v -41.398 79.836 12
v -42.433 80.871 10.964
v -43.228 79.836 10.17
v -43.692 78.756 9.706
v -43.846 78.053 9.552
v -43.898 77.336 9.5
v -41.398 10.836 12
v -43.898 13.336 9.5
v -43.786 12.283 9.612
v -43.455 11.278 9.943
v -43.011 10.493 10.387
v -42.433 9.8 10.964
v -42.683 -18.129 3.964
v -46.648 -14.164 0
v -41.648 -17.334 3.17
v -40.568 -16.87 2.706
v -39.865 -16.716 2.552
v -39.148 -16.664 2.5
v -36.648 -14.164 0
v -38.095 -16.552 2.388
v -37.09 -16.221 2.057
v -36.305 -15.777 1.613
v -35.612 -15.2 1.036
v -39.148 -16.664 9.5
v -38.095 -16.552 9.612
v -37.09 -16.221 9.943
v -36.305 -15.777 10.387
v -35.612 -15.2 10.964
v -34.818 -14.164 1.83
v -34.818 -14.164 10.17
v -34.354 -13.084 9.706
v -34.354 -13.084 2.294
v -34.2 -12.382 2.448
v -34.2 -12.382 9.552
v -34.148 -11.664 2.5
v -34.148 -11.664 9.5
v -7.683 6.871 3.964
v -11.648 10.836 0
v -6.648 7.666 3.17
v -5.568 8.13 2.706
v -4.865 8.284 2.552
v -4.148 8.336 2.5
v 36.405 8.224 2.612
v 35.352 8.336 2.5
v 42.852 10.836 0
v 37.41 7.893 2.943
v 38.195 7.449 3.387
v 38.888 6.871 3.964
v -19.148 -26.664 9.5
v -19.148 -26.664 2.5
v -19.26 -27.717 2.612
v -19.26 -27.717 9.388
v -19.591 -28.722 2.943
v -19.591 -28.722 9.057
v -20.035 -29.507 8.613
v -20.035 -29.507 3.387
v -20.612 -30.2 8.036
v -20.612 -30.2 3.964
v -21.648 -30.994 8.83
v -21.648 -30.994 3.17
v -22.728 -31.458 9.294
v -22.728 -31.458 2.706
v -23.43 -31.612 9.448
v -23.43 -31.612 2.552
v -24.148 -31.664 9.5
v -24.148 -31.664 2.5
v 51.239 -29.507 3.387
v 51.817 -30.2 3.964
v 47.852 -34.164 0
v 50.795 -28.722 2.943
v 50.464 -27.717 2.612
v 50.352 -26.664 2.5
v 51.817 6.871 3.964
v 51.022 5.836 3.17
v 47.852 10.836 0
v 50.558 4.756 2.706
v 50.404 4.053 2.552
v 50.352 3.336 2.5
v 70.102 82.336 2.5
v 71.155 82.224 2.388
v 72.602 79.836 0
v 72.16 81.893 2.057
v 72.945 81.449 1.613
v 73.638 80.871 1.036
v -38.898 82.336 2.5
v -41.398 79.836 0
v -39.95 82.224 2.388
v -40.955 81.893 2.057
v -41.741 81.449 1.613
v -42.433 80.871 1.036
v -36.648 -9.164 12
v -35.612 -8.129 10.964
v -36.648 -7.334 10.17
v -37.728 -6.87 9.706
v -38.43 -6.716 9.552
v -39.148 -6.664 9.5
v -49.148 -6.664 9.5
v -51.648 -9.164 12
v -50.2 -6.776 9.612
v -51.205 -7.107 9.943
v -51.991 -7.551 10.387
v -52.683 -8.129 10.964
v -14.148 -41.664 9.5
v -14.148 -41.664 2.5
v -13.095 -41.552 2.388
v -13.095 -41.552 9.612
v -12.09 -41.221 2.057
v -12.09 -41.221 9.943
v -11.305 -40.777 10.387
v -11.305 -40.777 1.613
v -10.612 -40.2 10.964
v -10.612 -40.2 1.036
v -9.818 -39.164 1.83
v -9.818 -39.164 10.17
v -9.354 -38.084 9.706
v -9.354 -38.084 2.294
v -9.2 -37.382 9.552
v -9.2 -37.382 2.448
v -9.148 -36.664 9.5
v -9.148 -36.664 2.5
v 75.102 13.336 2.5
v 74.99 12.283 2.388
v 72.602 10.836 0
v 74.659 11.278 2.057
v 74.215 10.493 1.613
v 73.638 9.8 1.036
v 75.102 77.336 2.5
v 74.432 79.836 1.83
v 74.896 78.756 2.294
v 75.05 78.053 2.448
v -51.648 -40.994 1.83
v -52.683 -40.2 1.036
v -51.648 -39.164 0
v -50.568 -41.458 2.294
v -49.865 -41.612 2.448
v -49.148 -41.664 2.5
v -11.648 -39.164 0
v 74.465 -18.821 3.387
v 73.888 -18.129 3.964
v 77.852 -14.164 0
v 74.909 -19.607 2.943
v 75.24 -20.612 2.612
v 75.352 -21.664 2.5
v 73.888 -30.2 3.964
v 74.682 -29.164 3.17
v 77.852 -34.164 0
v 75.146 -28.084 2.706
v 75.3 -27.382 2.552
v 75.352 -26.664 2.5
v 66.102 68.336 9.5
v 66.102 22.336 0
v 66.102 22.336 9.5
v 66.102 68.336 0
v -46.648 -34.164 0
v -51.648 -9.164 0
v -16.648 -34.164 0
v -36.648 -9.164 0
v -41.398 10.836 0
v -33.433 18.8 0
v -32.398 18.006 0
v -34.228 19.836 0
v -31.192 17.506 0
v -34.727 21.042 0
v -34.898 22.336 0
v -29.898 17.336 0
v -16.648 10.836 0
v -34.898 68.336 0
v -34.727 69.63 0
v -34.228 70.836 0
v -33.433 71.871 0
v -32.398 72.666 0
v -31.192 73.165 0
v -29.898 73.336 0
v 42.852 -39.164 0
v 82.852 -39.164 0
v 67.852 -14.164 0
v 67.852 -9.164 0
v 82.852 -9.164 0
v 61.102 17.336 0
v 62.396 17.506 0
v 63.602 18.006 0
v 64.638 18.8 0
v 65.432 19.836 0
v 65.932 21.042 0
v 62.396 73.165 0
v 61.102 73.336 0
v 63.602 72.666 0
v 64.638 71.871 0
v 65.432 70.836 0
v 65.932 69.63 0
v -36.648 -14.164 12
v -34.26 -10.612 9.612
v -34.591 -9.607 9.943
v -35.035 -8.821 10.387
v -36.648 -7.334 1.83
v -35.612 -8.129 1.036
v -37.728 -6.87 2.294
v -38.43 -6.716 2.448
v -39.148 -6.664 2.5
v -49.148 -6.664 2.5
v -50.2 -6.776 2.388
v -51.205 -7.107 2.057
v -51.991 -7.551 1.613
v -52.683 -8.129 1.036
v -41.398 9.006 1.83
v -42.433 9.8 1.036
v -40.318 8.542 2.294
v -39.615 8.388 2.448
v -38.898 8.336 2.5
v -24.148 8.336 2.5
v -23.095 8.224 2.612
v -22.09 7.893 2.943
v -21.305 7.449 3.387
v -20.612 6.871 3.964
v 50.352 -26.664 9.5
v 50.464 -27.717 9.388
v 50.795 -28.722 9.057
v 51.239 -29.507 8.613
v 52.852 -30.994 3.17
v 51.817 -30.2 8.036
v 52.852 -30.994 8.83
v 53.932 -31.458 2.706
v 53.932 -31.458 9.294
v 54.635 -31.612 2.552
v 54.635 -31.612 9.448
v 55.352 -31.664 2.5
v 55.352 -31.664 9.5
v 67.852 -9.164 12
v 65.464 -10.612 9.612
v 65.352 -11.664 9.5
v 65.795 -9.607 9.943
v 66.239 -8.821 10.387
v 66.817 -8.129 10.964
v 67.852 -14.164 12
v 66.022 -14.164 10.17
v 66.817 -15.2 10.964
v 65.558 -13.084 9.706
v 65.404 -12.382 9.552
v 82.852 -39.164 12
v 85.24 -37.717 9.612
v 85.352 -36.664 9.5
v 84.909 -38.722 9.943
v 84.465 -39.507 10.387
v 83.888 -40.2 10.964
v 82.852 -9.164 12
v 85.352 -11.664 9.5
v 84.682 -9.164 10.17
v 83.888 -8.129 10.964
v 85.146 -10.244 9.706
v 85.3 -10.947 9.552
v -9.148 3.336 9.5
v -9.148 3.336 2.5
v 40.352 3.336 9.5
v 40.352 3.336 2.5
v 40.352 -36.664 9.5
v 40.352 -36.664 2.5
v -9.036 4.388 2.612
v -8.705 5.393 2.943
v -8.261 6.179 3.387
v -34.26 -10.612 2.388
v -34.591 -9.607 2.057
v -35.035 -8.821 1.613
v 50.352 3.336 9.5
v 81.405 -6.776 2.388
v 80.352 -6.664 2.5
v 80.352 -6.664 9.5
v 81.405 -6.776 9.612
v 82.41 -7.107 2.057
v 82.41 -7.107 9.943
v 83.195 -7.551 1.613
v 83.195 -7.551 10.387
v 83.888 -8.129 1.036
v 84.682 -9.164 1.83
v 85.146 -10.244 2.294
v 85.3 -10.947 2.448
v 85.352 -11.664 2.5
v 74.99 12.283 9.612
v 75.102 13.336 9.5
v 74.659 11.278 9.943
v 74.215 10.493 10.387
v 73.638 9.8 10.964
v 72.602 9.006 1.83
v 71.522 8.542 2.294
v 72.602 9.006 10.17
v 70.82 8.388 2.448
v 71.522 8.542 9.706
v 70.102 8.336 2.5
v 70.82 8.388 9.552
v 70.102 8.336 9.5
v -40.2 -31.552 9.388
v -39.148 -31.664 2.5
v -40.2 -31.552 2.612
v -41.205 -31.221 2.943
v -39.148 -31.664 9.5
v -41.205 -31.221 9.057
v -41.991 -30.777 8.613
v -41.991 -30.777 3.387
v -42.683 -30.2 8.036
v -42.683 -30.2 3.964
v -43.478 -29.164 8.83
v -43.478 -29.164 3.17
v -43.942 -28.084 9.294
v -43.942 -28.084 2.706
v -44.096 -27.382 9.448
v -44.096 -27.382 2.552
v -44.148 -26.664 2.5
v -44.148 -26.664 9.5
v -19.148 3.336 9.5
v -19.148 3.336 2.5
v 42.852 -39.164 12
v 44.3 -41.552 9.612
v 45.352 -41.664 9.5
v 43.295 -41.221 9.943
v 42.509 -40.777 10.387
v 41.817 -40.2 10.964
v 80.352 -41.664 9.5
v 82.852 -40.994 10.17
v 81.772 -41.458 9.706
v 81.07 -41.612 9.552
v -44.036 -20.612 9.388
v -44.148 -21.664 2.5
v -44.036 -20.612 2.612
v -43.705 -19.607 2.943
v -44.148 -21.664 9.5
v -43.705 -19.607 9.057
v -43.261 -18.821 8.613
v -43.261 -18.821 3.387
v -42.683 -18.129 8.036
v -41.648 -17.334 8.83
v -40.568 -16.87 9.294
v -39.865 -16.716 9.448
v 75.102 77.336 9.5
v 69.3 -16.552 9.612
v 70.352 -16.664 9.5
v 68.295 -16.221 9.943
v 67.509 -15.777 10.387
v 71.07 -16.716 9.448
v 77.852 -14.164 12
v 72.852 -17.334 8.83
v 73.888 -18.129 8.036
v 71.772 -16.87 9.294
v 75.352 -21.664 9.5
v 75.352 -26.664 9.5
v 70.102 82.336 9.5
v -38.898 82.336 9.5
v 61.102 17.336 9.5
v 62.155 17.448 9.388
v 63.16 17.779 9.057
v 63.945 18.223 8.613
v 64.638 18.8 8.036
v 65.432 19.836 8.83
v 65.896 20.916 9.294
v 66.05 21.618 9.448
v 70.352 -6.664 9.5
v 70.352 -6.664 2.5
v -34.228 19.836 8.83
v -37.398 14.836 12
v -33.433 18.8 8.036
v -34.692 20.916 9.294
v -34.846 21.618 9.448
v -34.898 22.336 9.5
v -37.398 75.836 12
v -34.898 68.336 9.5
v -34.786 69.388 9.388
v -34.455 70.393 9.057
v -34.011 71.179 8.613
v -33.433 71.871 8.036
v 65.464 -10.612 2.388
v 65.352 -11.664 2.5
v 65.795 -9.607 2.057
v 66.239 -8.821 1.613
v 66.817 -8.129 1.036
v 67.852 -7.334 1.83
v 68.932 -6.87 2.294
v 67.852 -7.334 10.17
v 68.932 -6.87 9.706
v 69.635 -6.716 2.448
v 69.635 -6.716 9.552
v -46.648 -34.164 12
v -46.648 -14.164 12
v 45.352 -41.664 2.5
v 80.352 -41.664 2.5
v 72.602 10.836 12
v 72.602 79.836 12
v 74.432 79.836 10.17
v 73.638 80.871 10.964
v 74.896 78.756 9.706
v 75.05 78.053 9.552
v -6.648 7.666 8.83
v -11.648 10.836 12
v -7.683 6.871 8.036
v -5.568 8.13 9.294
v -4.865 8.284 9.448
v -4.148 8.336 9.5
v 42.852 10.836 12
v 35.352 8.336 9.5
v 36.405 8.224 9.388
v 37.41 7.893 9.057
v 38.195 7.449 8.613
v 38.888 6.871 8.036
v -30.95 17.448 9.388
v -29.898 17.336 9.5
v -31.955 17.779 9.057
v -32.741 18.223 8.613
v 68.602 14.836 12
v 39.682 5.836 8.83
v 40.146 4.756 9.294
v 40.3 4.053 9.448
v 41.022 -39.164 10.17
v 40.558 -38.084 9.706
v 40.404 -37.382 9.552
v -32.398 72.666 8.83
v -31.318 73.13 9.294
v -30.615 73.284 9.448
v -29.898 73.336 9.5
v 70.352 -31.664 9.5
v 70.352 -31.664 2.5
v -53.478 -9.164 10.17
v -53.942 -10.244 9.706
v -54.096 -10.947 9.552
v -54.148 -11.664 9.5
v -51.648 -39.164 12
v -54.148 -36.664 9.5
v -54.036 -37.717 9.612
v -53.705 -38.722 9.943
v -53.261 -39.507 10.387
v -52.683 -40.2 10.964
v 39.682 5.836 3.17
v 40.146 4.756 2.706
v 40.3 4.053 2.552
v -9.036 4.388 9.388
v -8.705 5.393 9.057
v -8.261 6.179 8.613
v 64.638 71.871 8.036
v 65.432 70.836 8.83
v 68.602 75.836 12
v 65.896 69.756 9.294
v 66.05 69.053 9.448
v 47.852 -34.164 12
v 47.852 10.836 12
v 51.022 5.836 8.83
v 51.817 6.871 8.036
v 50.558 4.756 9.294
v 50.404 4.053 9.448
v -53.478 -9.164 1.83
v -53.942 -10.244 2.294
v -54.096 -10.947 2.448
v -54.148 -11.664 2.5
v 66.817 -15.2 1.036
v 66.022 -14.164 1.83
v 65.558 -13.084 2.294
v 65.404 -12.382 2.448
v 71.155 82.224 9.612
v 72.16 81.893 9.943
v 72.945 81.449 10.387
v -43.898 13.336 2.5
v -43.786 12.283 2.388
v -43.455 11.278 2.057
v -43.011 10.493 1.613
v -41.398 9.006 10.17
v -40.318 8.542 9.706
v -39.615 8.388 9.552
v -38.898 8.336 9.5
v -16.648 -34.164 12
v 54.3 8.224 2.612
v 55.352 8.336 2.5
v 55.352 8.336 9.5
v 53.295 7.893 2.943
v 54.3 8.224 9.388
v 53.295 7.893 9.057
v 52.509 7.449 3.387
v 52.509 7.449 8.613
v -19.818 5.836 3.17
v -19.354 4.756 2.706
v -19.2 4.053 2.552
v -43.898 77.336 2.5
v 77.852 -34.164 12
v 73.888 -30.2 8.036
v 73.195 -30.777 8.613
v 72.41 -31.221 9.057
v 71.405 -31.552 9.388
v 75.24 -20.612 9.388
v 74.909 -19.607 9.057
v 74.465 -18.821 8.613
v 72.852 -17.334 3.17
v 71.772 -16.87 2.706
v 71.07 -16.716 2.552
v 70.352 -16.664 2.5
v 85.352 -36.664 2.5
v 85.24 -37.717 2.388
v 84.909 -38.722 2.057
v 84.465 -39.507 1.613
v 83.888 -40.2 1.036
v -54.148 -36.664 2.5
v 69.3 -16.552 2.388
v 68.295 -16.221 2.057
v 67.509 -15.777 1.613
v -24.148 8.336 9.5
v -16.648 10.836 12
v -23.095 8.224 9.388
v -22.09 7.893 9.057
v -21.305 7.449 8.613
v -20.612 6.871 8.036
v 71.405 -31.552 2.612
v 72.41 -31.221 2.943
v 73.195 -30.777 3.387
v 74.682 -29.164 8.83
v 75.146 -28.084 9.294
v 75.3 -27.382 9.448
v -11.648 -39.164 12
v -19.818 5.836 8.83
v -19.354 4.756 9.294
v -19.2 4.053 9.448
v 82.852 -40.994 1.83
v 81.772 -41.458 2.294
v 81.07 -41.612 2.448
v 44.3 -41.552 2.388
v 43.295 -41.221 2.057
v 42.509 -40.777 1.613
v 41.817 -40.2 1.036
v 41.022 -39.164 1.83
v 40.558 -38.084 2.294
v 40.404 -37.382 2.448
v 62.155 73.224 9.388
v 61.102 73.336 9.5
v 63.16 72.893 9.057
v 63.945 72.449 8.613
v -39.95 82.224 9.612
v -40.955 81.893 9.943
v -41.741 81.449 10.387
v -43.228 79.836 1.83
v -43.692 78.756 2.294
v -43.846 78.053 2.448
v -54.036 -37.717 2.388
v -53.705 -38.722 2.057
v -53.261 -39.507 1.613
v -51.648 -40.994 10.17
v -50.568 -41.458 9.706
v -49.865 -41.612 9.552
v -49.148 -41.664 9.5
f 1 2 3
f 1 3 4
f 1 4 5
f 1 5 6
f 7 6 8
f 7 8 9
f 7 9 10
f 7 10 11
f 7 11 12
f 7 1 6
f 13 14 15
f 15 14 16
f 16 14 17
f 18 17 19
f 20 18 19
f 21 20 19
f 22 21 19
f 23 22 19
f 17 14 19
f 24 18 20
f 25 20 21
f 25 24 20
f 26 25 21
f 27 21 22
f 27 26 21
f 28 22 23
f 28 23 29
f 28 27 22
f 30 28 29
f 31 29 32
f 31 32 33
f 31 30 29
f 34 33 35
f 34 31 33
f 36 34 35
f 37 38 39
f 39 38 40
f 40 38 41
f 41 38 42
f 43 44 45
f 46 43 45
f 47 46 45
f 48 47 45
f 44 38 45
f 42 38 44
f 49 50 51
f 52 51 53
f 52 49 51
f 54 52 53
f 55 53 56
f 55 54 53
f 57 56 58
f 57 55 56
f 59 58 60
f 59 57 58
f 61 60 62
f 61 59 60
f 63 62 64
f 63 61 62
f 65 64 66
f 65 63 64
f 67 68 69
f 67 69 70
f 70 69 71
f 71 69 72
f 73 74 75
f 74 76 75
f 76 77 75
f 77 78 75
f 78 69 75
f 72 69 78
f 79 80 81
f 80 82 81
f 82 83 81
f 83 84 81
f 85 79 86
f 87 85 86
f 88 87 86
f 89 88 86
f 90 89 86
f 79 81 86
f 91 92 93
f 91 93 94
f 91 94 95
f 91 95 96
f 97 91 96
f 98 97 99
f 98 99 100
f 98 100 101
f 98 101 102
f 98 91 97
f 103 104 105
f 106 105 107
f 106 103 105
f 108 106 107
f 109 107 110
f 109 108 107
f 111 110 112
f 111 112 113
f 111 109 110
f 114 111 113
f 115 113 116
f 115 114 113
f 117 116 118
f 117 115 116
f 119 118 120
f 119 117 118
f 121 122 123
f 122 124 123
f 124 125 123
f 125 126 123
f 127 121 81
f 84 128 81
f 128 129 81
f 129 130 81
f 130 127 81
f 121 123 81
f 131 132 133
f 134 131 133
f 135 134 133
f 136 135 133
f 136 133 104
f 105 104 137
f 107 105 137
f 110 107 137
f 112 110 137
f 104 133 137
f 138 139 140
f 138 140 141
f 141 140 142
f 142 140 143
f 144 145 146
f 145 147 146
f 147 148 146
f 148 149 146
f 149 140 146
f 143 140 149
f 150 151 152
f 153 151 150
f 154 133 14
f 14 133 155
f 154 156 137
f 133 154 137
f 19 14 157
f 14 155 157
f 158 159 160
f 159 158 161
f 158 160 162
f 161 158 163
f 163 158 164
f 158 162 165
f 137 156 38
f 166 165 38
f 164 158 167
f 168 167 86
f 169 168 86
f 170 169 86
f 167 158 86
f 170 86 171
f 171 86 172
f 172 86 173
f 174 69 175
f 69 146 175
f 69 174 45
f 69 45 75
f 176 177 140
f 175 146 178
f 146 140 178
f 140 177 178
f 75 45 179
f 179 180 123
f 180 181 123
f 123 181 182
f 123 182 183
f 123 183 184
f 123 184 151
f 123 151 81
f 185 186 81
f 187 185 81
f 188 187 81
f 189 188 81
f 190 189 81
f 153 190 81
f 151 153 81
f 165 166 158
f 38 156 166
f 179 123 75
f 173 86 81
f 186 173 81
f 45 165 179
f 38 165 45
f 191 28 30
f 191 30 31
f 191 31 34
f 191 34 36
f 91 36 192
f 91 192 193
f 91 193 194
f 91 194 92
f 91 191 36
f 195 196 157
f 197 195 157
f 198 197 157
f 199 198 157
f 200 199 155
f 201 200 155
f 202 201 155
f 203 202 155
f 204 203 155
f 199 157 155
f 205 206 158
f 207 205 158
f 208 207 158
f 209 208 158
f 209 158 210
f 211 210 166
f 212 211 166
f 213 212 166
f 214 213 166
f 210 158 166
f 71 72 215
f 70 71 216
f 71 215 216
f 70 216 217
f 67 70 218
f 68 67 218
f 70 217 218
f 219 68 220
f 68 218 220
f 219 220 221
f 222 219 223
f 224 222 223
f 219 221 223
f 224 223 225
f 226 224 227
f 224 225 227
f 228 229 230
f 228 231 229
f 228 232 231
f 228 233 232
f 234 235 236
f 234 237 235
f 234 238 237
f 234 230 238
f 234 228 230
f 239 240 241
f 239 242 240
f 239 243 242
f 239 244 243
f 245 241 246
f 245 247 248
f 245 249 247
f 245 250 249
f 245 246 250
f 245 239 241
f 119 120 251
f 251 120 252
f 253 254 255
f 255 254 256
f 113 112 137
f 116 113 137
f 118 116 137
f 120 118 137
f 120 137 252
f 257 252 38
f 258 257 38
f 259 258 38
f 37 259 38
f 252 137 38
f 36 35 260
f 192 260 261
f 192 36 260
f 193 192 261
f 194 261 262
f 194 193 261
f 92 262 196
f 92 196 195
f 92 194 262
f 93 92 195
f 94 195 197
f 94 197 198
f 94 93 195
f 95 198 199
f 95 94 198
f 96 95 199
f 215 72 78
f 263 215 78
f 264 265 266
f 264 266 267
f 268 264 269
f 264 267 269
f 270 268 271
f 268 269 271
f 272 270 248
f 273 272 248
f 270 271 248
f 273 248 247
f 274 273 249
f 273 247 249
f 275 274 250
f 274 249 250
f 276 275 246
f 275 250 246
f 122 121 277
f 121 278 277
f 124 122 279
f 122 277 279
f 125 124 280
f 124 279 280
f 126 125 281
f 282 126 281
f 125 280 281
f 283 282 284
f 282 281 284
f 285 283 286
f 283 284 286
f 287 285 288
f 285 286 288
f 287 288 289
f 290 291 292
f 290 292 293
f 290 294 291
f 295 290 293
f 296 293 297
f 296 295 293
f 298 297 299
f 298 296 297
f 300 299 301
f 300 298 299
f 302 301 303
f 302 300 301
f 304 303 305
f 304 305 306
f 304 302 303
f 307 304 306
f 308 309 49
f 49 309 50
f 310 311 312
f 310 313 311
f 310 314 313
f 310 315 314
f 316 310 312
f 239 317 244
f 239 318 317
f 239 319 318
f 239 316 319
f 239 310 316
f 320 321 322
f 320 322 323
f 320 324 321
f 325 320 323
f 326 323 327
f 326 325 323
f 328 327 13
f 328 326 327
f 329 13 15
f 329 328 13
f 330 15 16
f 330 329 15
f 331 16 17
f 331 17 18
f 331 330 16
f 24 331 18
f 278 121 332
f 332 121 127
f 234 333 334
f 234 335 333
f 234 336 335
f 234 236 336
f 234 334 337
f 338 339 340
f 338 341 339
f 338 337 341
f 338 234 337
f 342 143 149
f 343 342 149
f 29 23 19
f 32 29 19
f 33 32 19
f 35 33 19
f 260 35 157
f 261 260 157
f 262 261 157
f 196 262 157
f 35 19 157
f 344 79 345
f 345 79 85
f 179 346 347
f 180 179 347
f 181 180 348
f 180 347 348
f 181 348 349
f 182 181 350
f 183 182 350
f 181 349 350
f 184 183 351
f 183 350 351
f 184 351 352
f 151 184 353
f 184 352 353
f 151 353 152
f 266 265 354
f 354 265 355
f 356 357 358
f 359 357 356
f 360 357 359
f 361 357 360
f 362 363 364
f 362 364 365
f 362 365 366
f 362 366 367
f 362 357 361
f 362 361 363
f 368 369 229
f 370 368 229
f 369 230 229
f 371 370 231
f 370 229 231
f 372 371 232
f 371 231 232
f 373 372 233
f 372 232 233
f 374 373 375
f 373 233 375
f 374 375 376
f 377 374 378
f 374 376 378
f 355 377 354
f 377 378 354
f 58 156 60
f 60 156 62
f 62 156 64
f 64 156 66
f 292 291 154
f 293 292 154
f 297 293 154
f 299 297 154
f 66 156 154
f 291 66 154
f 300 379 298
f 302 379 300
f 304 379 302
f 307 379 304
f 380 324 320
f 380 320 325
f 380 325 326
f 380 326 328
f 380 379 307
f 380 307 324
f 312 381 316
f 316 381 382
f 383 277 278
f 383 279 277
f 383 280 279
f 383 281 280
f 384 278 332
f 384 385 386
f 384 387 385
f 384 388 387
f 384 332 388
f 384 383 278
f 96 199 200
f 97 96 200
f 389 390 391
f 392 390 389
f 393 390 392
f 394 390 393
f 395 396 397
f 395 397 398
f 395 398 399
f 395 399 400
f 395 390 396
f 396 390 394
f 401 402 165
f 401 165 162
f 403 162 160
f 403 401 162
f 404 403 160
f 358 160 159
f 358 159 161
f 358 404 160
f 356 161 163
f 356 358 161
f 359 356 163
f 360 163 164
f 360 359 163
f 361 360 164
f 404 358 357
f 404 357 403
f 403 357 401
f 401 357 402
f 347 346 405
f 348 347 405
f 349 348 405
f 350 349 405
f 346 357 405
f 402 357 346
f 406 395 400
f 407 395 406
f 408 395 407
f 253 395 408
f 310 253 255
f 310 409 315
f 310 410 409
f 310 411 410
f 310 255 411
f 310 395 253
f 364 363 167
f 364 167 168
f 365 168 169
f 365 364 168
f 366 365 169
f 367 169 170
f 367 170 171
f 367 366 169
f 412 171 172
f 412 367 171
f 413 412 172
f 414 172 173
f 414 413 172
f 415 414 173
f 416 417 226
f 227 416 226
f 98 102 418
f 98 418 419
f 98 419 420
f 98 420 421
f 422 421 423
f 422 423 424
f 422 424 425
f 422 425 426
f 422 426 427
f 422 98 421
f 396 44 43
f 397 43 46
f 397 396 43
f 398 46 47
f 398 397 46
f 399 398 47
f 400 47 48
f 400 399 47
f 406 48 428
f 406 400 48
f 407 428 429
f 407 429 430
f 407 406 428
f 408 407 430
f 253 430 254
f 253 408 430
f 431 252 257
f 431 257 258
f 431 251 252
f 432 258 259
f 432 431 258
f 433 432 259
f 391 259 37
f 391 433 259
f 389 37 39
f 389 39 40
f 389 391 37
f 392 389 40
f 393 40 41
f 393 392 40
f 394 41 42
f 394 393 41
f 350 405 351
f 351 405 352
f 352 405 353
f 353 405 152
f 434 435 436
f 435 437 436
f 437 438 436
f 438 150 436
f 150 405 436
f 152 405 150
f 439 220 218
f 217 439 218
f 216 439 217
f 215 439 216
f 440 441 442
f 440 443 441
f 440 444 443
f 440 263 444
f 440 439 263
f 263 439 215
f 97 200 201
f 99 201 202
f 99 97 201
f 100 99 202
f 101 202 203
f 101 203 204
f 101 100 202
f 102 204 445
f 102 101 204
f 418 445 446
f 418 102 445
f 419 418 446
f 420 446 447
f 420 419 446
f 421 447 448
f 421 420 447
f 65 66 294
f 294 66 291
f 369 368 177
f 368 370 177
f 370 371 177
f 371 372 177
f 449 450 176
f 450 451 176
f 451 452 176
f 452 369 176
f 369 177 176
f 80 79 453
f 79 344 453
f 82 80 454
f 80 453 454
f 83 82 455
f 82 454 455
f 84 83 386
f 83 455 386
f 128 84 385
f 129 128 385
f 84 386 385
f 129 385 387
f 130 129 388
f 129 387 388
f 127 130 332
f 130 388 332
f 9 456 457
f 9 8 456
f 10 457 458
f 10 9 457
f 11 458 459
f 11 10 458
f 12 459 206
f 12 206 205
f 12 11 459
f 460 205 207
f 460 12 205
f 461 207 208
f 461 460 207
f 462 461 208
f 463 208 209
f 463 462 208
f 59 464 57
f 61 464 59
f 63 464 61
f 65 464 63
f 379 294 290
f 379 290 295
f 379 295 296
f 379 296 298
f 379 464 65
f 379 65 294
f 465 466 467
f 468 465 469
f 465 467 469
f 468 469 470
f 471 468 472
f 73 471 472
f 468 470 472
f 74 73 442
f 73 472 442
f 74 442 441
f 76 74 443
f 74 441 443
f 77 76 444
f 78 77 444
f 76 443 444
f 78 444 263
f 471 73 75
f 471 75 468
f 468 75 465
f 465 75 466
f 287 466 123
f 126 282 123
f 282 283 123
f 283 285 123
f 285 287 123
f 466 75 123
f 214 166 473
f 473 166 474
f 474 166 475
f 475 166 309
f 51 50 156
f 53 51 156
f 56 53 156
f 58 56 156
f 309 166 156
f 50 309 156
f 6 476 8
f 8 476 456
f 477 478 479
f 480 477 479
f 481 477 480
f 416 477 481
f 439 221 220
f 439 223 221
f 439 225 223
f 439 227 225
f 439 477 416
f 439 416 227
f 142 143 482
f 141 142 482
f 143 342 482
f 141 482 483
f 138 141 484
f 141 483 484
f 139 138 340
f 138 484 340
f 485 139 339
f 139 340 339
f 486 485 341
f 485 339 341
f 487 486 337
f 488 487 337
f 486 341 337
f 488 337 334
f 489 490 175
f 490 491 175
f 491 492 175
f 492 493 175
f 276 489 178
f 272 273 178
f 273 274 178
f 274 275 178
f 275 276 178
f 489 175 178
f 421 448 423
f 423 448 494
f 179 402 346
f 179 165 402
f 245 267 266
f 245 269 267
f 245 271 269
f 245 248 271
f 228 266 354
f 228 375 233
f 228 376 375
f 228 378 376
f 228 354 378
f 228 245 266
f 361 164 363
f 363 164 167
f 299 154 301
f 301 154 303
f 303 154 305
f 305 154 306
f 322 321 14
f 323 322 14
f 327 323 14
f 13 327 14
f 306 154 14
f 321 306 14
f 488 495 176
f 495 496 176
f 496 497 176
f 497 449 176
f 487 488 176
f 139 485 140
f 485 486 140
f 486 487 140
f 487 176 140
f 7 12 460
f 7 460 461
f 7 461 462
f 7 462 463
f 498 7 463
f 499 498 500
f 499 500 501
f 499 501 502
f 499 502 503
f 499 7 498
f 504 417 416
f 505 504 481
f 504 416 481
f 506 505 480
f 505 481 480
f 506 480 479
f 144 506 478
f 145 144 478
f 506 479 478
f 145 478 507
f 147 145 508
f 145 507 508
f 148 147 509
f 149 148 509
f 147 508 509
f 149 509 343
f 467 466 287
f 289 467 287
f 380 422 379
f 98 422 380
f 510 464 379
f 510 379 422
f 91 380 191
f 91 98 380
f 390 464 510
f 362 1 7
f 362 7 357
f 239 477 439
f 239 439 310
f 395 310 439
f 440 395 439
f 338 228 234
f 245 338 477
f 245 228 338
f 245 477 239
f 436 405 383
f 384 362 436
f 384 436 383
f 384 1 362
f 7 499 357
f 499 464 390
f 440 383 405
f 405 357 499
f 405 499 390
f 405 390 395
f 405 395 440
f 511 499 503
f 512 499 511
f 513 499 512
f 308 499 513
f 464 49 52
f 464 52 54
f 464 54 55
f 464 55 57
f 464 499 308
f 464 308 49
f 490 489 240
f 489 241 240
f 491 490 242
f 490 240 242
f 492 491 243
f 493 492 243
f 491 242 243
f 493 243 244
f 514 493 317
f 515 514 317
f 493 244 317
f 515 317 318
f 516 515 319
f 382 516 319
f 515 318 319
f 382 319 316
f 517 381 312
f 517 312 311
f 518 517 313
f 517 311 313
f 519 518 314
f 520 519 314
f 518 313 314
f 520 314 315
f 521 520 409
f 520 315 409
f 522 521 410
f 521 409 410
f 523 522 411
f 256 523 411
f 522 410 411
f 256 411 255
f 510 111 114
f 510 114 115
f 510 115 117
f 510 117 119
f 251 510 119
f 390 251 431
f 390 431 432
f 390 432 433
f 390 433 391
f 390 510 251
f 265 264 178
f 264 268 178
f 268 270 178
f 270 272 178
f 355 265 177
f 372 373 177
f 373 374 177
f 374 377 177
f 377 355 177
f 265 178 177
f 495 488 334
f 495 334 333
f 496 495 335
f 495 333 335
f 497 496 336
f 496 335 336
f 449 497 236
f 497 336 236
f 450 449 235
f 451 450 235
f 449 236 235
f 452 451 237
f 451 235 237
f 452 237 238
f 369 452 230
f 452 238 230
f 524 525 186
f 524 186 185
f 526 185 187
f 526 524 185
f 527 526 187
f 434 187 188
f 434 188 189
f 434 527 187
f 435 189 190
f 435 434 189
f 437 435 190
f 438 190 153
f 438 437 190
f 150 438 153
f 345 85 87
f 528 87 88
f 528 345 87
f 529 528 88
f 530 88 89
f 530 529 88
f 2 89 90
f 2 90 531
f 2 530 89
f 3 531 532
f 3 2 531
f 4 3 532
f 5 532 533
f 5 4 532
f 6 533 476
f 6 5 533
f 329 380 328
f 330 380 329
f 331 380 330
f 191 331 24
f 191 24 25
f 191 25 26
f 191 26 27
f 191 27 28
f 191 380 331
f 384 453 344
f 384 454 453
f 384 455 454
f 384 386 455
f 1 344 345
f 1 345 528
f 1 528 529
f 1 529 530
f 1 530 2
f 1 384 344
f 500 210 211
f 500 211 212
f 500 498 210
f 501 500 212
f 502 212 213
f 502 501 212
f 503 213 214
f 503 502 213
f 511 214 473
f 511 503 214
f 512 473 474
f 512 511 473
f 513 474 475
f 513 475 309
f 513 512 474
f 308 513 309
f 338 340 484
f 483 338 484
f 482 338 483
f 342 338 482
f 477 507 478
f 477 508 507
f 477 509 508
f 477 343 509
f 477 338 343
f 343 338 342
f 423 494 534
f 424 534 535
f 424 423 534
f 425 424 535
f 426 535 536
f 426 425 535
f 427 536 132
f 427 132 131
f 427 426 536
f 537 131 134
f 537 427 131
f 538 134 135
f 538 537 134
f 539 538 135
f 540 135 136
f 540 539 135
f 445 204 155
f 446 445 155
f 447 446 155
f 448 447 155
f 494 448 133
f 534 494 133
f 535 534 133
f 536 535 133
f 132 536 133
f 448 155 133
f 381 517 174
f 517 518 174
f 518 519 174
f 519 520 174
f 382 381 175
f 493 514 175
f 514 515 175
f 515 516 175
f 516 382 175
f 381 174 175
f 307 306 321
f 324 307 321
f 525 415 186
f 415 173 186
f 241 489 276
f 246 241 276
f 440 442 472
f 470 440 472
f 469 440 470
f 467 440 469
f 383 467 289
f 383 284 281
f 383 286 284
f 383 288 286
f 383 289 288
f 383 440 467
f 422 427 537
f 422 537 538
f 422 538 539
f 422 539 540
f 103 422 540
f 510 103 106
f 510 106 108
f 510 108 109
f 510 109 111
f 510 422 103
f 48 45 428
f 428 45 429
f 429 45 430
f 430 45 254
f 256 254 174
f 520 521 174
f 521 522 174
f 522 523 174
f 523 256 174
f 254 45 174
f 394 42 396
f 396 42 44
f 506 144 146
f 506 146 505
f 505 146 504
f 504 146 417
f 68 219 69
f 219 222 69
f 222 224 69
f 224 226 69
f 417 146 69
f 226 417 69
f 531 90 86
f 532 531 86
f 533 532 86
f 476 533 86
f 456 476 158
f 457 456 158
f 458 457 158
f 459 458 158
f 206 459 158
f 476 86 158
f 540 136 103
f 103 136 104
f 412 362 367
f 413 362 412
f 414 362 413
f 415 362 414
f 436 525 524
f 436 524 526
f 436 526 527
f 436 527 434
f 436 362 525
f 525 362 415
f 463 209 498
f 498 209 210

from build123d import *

# Parameters (mm, degrees)
F0_W     = 101
F0_H     = 56
F1_DEPTH = 12
F2_SIZE  = 2.5
F3_R     = 4.99999


# Not quite as in the source:
# - a fillet or chamfer is up to 0.001 mm smaller than in the source, because OpenCascade refuses the exact size


with BuildPart() as f1:
    # F0 (on Top) → F1 (new body)
    with BuildSketch(Plane.XY):
        Polygon((75.1021924019, 82.3358418196), (-43.8978075981, 82.3358418196), (-43.8978075981, 8.3358418196), (-19.1478075981, 8.3358418196), (-9.1478075981, 8.3358418196), (15.6021924019, 8.3358418196), (40.3521924019, 8.3358418196), (50.3521924019, 8.3358418196), (75.1021924019, 8.3358418196), align=None)
        with Locations((15.6021924019, 45.3358418196)):
            Rectangle(F0_W, F0_H, mode=Mode.SUBTRACT)
        Polygon((-9.1478075981, 8.3358418196), (-19.1478075981, 8.3358418196), (-19.1478075981, -31.6641581804), (-44.1478075981, -31.6641581804), (-44.1478075981, -16.6641581804), (-34.1478075981, -16.6641581804), (-34.1478075981, -6.6641581804), (-44.1478075981, -6.6641581804), (-54.1478075981, -6.6641581804), (-54.1478075981, -41.6641581804), (-9.1478075981, -41.6641581804), align=None)
        Polygon((50.3521924019, -31.6641581804), (50.3521924019, 8.3358418196), (40.3521924019, 8.3358418196), (40.3521924019, -41.6641581804), (85.3521924019, -41.6641581804), (85.3521924019, -6.6641581804), (75.3521924019, -6.6641581804), (65.3521924019, -6.6641581804), (65.3521924019, -16.6641581804), (75.3521924019, -16.6641581804), (75.3521924019, -31.6641581804), align=None)
    extrude(amount=F1_DEPTH)

    # F2
    f2_edges = [f1.edges().sort_by_distance(p)[0] for p in [
        (-43.897808, 45.335842, 0),
        (15.602192, 82.335842, 0),
        (75.102192, 45.335842, 0),
        (62.727192, 8.335842, 0),
        (50.352192, -11.664158, 0),
        (62.852192, -31.664158, 0),
        (75.352192, -24.164158, 0),
        (70.352192, -16.664158, 0),
        (65.352192, -11.664158, 0),
        (75.352192, -6.664158, 0),
        (85.352192, -24.164158, 0),
        (62.852192, -41.664158, 0),
        (-31.522808, 8.335842, 0),
        (40.352192, -16.664158, 0),
        (-9.147808, -16.664158, 0),
        (-31.647808, -41.664158, 0),
        (-54.147808, -24.164158, 0),
        (-44.147808, -6.664158, 0),
        (-31.647808, -31.664158, 0),
        (-19.147808, -11.664158, 0),
        (-31.522808, 8.335842, 12),
        (62.727192, 8.335842, 12),
        (15.602192, 82.335842, 12),
        (-43.897808, 45.335842, 12),
        (-19.147808, -11.664158, 12),
        (-31.647808, -31.664158, 12),
        (-44.147808, -24.164158, 12),
        (-39.147808, -16.664158, 12),
        (-34.147808, -11.664158, 12),
        (-44.147808, -6.664158, 12),
        (-54.147808, -24.164158, 12),
        (-31.647808, -41.664158, 12),
        (-9.147808, -16.664158, 12),
        (15.602192, 8.335842, 12),
        (40.352192, -16.664158, 12),
        (62.852192, -41.664158, 12),
        (85.352192, -24.164158, 12),
        (75.352192, -6.664158, 12),
        (65.352192, -11.664158, 12),
        (70.352192, -16.664158, 12),
        (75.352192, -24.164158, 12),
        (62.852192, -31.664158, 12),
        (50.352192, -11.664158, 12),
        (75.102192, 45.335842, 12),
        (15.602192, 17.335842, 12),
        (-34.897808, 45.335842, 12),
        (15.602192, 73.335842, 12),
        (66.102192, 45.335842, 12),
        (-39.147808, -16.664158, 0),
        (-44.147808, -24.164158, 0),
        (-34.147808, -11.664158, 0),
        (15.602192, 8.335842, 0),
    ]]
    chamfer(f2_edges, length=F2_SIZE)

    # F3 (radius 5 in the source; OpenCascade refuses exactly that, so slightly less here)
    f3_edges = [f1.edges().sort_by_distance(p)[0] for p in [
        (-34.897808, 73.335842, 4.75),
        (-34.897808, 17.335842, 4.75),
        (66.102192, 17.335842, 4.75),
        (66.102192, 73.335842, 4.75),
        (75.102192, 8.335842, 6),
        (-43.897808, 8.335842, 6),
        (-43.897808, 82.335842, 6),
        (75.102192, 82.335842, 6),
        (-19.147808, 8.335842, 6),
        (-9.147808, 8.335842, 6),
        (40.352192, 8.335842, 6),
        (50.352192, 8.335842, 6),
        (-9.147808, -41.664158, 6),
        (-54.147808, -41.664158, 6),
        (-54.147808, -6.664158, 6),
        (-34.147808, -6.664158, 6),
        (-34.147808, -16.664158, 6),
        (-44.147808, -16.664158, 6),
        (-44.147808, -31.664158, 6),
        (-19.147808, -31.664158, 6),
        (40.352192, -41.664158, 6),
        (85.352192, -41.664158, 6),
        (85.352192, -6.664158, 6),
        (65.352192, -6.664158, 6),
        (65.352192, -16.664158, 6),
        (75.352192, -16.664158, 6),
        (50.352192, -31.664158, 6),
        (75.352192, -31.664158, 6),
    ]]
    fillet(f3_edges, radius=F3_R)


solid = f1.part
